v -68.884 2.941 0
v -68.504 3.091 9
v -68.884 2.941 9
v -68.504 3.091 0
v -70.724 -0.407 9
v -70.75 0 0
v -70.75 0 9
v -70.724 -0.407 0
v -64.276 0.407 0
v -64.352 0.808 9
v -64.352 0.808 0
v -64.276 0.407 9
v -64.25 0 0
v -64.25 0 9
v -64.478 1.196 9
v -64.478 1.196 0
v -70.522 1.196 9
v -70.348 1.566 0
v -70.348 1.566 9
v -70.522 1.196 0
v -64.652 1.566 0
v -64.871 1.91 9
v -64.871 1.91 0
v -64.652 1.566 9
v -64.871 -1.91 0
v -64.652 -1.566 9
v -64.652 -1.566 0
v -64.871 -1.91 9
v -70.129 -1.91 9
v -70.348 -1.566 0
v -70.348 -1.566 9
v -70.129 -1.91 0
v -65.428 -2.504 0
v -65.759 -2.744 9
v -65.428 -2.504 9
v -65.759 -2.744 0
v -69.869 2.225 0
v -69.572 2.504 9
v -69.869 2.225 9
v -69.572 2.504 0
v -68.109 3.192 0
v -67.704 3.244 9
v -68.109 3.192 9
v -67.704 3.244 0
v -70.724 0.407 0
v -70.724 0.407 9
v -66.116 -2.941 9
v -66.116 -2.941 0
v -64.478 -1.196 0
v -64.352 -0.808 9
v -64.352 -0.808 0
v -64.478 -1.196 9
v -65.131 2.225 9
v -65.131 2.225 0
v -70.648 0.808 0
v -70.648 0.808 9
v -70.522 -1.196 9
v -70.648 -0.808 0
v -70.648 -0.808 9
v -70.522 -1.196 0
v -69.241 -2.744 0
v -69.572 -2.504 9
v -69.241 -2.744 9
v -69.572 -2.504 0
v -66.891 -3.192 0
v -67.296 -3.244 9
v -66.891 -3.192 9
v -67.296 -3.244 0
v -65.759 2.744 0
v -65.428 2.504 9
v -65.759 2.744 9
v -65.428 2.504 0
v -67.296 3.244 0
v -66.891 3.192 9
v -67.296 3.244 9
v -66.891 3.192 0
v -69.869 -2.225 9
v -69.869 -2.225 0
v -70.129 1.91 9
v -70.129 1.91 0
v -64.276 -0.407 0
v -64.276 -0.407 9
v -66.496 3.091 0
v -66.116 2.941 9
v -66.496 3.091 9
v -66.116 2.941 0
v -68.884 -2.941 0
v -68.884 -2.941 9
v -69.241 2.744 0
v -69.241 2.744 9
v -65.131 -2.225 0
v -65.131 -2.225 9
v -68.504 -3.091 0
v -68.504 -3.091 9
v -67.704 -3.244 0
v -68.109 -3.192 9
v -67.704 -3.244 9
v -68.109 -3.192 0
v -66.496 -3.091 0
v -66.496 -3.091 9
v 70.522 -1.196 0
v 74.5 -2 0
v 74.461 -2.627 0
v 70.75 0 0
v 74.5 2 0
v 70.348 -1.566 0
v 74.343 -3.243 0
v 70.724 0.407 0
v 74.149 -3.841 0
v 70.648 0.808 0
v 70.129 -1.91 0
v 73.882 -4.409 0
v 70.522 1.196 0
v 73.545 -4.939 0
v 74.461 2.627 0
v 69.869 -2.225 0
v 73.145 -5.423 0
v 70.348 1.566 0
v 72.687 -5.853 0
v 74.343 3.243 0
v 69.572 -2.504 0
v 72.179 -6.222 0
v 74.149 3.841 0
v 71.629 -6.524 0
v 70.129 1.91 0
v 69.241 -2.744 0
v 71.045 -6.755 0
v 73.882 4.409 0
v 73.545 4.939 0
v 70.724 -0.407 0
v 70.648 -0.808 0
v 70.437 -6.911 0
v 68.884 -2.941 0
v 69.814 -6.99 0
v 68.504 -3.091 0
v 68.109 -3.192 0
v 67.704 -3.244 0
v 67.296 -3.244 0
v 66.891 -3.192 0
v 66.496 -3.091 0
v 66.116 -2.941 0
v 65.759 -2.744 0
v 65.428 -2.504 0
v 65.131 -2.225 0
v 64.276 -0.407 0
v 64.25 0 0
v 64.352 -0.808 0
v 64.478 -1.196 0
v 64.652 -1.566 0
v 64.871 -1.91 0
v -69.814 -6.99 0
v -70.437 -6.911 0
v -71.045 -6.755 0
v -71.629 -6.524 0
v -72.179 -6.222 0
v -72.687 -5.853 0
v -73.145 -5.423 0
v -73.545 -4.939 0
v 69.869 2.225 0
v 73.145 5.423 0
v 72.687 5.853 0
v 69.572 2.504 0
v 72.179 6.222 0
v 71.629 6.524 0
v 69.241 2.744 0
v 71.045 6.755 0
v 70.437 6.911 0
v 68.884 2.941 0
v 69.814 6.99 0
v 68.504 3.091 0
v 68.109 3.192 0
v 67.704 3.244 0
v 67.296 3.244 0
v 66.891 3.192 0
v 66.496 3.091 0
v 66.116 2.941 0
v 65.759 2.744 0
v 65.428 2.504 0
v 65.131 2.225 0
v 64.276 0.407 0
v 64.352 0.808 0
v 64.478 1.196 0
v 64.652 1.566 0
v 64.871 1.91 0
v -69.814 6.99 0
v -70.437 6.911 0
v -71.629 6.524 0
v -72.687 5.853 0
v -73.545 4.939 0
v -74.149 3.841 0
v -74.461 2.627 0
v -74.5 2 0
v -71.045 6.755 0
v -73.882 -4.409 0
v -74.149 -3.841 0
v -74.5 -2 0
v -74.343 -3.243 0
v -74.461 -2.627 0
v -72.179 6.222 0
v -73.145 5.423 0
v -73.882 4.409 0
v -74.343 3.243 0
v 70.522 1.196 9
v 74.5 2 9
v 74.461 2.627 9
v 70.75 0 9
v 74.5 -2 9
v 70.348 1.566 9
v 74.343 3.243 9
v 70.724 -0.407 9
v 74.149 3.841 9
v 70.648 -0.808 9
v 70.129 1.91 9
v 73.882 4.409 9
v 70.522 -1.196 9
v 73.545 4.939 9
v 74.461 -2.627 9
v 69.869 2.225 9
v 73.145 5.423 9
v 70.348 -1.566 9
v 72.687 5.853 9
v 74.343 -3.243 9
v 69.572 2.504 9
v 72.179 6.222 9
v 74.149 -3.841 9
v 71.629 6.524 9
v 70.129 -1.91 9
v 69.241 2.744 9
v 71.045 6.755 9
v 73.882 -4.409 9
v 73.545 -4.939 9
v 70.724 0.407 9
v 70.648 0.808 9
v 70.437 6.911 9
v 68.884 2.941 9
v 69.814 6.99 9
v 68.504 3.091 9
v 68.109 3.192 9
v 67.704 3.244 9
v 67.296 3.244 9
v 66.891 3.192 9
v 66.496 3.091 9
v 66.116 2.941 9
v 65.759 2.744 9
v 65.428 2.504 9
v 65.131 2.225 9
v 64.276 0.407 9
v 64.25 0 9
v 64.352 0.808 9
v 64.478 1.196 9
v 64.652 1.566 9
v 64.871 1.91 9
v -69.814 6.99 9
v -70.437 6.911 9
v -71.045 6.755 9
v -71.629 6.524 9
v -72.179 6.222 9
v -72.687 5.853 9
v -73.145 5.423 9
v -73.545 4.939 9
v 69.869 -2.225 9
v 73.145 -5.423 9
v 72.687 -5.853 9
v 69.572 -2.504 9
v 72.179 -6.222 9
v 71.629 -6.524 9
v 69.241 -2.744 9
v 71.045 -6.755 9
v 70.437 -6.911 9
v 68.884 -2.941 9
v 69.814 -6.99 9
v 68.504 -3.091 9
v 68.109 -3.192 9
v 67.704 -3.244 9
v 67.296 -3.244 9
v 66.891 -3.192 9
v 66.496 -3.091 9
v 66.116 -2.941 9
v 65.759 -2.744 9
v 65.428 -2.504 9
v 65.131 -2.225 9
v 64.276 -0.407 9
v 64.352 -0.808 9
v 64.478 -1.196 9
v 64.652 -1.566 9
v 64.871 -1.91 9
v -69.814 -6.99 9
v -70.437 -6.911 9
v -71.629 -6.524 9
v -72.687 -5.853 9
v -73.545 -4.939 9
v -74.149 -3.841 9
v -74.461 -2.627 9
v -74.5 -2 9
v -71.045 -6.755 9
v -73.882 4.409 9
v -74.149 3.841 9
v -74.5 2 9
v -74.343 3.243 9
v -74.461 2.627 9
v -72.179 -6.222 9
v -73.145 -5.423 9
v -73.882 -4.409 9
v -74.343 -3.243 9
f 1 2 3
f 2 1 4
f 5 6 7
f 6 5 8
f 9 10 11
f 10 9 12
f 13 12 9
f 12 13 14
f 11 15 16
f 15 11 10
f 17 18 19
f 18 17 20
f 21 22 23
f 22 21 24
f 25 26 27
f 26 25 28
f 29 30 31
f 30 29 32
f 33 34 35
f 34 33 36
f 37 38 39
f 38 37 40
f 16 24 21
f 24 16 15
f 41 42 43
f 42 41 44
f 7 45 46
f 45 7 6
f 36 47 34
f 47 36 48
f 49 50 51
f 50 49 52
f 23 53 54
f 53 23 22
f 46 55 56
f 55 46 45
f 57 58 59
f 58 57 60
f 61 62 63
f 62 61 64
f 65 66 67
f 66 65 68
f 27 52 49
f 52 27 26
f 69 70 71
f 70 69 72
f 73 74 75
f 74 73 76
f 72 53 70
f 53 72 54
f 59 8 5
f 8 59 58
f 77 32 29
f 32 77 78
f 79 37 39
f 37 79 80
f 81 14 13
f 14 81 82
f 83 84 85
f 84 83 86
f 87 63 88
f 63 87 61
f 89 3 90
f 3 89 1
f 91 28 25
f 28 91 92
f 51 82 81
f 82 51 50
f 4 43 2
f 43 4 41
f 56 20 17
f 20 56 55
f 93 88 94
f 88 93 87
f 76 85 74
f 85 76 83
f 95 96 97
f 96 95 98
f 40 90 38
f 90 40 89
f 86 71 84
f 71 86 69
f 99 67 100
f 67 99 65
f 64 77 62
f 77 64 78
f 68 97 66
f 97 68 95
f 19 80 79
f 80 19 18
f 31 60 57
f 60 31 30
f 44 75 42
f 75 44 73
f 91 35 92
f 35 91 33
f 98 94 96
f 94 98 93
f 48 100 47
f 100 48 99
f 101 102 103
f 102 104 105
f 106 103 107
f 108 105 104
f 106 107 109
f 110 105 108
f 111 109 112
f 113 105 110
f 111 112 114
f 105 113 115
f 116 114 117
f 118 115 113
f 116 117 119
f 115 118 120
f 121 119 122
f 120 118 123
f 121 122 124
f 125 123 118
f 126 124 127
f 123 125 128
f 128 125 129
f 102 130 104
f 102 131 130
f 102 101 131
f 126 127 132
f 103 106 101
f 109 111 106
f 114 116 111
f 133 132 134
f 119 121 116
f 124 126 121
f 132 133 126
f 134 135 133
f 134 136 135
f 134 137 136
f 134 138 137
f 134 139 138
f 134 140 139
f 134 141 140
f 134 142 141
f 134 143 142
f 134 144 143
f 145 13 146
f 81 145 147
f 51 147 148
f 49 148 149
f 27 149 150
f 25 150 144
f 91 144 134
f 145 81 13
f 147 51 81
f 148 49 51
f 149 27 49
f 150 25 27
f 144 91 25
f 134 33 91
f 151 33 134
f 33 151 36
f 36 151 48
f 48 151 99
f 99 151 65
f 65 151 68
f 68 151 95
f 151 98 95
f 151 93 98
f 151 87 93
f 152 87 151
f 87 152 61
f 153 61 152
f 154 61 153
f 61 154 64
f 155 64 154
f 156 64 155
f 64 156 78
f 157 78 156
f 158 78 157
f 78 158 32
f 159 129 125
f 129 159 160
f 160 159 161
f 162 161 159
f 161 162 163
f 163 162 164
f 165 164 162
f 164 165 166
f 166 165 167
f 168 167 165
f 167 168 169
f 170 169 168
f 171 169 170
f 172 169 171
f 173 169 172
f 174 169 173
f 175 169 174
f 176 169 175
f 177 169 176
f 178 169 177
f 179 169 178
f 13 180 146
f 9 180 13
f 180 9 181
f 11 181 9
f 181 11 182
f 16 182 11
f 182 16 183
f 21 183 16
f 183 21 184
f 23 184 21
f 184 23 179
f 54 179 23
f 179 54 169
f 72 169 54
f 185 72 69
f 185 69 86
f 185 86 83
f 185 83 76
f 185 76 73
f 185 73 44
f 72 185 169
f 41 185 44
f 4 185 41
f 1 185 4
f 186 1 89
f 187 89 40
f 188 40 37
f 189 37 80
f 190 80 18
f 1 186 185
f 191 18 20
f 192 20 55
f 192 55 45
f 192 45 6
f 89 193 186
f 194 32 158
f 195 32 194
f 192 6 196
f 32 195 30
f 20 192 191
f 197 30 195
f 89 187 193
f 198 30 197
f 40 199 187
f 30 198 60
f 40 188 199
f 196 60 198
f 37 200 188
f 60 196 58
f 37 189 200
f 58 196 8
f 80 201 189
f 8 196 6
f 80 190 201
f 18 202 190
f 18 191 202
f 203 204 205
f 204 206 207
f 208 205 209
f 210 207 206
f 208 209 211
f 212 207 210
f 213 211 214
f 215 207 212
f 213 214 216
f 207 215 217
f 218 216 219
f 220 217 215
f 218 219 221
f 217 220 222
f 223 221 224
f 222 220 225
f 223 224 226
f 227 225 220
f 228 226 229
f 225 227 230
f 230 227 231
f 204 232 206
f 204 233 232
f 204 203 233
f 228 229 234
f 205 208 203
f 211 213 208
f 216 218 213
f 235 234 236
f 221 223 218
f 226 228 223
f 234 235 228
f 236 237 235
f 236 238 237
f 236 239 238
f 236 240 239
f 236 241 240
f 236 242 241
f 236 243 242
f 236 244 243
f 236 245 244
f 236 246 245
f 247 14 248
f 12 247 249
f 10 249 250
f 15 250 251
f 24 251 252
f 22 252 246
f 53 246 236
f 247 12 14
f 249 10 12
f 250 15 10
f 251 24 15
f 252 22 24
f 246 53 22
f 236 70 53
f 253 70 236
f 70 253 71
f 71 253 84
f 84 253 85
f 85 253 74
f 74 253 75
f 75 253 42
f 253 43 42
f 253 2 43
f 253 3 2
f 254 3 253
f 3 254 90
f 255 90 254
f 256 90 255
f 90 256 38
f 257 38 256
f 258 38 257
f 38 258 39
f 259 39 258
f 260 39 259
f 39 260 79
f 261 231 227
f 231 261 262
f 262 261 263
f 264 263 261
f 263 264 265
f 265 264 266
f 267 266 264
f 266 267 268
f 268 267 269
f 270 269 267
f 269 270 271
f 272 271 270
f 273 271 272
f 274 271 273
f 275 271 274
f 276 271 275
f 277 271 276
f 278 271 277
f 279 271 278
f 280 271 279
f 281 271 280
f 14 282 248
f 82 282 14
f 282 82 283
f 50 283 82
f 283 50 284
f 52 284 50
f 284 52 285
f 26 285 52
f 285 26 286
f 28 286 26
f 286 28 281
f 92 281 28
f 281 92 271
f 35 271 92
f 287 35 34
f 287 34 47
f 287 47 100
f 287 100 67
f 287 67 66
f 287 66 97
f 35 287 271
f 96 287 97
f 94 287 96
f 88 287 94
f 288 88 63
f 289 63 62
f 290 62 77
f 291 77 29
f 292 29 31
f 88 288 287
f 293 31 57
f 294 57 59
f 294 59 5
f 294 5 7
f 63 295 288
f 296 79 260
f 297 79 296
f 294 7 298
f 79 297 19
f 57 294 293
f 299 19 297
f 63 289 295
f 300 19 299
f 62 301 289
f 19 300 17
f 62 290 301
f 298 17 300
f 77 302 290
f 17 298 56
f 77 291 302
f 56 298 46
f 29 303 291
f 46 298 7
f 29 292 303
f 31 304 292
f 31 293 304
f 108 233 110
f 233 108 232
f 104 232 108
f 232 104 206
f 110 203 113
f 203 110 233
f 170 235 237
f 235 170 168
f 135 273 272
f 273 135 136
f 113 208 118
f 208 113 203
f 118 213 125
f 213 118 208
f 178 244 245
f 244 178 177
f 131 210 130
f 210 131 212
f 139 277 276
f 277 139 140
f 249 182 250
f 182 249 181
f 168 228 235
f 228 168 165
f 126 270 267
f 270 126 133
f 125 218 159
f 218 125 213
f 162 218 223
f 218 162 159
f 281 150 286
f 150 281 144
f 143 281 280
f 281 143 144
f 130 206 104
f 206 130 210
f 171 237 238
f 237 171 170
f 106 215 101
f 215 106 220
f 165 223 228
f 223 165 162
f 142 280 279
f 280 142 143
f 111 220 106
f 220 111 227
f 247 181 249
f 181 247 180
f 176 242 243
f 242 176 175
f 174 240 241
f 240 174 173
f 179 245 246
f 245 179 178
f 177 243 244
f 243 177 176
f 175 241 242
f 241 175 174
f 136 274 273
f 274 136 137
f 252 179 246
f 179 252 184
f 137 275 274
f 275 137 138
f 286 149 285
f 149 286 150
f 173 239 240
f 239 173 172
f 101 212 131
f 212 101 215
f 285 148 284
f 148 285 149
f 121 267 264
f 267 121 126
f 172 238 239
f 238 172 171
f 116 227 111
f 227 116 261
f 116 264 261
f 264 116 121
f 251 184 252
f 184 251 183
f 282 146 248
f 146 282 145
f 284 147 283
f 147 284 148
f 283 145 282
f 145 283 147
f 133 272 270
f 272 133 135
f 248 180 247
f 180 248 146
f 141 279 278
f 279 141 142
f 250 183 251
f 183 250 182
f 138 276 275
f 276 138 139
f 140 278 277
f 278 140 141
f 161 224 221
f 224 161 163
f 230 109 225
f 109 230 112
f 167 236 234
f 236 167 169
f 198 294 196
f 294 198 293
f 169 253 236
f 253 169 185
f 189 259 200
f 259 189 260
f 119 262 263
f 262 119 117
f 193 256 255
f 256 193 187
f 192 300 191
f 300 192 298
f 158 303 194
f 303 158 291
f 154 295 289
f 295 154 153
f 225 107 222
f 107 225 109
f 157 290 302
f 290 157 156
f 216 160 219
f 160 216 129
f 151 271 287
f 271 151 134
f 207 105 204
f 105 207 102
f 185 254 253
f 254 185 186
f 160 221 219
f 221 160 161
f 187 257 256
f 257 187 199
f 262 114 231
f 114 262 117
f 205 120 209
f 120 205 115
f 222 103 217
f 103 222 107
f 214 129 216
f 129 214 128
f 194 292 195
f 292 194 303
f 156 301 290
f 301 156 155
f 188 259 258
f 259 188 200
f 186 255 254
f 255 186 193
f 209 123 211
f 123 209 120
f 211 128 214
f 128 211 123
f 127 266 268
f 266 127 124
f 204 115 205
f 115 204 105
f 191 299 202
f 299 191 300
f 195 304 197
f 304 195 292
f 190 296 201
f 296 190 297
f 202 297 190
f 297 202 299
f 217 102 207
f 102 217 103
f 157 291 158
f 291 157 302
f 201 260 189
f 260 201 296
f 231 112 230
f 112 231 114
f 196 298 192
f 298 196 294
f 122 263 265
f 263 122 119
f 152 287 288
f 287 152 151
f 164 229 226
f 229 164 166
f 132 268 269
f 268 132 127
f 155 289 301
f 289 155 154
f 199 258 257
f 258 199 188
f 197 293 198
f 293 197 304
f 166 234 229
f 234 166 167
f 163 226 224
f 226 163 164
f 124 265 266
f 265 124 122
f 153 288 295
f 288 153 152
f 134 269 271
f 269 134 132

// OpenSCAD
$fn = 50;


difference() {
	union() {
		hull() {
			translate(v = [-69.5000000000, 2.0000000000, 0]) {
				cylinder(h = 9, r = 5);
			}
			translate(v = [69.5000000000, 2.0000000000, 0]) {
				cylinder(h = 9, r = 5);
			}
			translate(v = [-69.5000000000, -2.0000000000, 0]) {
				cylinder(h = 9, r = 5);
			}
			translate(v = [69.5000000000, -2.0000000000, 0]) {
				cylinder(h = 9, r = 5);
			}
		}
	}
	union() {
		translate(v = [-67.5000000000, 0.0000000000, 0]) {
			cylinder(h = 9, r = 3.2500000000);
		}
		translate(v = [67.5000000000, 0.0000000000, 0]) {
			cylinder(h = 9, r = 3.2500000000);
		}
		translate(v = [-67.5000000000, 0.0000000000, 0]) {
			cylinder(h = 9, r = 1.8000000000);
		}
		translate(v = [67.5000000000, 0.0000000000, 0]) {
			cylinder(h = 9, r = 1.8000000000);
		}
		translate(v = [-67.5000000000, 0.0000000000, 0]) {
			cylinder(h = 9, r = 1.8000000000);
		}
		translate(v = [67.5000000000, 0.0000000000, 0]) {
			cylinder(h = 9, r = 1.8000000000);
		}
		translate(v = [-67.5000000000, 0.0000000000, 0]) {
			cylinder(h = 9, r = 1.8000000000);
		}
		translate(v = [67.5000000000, 0.0000000000, 0]) {
			cylinder(h = 9, r = 1.8000000000);
		}
	}
}
